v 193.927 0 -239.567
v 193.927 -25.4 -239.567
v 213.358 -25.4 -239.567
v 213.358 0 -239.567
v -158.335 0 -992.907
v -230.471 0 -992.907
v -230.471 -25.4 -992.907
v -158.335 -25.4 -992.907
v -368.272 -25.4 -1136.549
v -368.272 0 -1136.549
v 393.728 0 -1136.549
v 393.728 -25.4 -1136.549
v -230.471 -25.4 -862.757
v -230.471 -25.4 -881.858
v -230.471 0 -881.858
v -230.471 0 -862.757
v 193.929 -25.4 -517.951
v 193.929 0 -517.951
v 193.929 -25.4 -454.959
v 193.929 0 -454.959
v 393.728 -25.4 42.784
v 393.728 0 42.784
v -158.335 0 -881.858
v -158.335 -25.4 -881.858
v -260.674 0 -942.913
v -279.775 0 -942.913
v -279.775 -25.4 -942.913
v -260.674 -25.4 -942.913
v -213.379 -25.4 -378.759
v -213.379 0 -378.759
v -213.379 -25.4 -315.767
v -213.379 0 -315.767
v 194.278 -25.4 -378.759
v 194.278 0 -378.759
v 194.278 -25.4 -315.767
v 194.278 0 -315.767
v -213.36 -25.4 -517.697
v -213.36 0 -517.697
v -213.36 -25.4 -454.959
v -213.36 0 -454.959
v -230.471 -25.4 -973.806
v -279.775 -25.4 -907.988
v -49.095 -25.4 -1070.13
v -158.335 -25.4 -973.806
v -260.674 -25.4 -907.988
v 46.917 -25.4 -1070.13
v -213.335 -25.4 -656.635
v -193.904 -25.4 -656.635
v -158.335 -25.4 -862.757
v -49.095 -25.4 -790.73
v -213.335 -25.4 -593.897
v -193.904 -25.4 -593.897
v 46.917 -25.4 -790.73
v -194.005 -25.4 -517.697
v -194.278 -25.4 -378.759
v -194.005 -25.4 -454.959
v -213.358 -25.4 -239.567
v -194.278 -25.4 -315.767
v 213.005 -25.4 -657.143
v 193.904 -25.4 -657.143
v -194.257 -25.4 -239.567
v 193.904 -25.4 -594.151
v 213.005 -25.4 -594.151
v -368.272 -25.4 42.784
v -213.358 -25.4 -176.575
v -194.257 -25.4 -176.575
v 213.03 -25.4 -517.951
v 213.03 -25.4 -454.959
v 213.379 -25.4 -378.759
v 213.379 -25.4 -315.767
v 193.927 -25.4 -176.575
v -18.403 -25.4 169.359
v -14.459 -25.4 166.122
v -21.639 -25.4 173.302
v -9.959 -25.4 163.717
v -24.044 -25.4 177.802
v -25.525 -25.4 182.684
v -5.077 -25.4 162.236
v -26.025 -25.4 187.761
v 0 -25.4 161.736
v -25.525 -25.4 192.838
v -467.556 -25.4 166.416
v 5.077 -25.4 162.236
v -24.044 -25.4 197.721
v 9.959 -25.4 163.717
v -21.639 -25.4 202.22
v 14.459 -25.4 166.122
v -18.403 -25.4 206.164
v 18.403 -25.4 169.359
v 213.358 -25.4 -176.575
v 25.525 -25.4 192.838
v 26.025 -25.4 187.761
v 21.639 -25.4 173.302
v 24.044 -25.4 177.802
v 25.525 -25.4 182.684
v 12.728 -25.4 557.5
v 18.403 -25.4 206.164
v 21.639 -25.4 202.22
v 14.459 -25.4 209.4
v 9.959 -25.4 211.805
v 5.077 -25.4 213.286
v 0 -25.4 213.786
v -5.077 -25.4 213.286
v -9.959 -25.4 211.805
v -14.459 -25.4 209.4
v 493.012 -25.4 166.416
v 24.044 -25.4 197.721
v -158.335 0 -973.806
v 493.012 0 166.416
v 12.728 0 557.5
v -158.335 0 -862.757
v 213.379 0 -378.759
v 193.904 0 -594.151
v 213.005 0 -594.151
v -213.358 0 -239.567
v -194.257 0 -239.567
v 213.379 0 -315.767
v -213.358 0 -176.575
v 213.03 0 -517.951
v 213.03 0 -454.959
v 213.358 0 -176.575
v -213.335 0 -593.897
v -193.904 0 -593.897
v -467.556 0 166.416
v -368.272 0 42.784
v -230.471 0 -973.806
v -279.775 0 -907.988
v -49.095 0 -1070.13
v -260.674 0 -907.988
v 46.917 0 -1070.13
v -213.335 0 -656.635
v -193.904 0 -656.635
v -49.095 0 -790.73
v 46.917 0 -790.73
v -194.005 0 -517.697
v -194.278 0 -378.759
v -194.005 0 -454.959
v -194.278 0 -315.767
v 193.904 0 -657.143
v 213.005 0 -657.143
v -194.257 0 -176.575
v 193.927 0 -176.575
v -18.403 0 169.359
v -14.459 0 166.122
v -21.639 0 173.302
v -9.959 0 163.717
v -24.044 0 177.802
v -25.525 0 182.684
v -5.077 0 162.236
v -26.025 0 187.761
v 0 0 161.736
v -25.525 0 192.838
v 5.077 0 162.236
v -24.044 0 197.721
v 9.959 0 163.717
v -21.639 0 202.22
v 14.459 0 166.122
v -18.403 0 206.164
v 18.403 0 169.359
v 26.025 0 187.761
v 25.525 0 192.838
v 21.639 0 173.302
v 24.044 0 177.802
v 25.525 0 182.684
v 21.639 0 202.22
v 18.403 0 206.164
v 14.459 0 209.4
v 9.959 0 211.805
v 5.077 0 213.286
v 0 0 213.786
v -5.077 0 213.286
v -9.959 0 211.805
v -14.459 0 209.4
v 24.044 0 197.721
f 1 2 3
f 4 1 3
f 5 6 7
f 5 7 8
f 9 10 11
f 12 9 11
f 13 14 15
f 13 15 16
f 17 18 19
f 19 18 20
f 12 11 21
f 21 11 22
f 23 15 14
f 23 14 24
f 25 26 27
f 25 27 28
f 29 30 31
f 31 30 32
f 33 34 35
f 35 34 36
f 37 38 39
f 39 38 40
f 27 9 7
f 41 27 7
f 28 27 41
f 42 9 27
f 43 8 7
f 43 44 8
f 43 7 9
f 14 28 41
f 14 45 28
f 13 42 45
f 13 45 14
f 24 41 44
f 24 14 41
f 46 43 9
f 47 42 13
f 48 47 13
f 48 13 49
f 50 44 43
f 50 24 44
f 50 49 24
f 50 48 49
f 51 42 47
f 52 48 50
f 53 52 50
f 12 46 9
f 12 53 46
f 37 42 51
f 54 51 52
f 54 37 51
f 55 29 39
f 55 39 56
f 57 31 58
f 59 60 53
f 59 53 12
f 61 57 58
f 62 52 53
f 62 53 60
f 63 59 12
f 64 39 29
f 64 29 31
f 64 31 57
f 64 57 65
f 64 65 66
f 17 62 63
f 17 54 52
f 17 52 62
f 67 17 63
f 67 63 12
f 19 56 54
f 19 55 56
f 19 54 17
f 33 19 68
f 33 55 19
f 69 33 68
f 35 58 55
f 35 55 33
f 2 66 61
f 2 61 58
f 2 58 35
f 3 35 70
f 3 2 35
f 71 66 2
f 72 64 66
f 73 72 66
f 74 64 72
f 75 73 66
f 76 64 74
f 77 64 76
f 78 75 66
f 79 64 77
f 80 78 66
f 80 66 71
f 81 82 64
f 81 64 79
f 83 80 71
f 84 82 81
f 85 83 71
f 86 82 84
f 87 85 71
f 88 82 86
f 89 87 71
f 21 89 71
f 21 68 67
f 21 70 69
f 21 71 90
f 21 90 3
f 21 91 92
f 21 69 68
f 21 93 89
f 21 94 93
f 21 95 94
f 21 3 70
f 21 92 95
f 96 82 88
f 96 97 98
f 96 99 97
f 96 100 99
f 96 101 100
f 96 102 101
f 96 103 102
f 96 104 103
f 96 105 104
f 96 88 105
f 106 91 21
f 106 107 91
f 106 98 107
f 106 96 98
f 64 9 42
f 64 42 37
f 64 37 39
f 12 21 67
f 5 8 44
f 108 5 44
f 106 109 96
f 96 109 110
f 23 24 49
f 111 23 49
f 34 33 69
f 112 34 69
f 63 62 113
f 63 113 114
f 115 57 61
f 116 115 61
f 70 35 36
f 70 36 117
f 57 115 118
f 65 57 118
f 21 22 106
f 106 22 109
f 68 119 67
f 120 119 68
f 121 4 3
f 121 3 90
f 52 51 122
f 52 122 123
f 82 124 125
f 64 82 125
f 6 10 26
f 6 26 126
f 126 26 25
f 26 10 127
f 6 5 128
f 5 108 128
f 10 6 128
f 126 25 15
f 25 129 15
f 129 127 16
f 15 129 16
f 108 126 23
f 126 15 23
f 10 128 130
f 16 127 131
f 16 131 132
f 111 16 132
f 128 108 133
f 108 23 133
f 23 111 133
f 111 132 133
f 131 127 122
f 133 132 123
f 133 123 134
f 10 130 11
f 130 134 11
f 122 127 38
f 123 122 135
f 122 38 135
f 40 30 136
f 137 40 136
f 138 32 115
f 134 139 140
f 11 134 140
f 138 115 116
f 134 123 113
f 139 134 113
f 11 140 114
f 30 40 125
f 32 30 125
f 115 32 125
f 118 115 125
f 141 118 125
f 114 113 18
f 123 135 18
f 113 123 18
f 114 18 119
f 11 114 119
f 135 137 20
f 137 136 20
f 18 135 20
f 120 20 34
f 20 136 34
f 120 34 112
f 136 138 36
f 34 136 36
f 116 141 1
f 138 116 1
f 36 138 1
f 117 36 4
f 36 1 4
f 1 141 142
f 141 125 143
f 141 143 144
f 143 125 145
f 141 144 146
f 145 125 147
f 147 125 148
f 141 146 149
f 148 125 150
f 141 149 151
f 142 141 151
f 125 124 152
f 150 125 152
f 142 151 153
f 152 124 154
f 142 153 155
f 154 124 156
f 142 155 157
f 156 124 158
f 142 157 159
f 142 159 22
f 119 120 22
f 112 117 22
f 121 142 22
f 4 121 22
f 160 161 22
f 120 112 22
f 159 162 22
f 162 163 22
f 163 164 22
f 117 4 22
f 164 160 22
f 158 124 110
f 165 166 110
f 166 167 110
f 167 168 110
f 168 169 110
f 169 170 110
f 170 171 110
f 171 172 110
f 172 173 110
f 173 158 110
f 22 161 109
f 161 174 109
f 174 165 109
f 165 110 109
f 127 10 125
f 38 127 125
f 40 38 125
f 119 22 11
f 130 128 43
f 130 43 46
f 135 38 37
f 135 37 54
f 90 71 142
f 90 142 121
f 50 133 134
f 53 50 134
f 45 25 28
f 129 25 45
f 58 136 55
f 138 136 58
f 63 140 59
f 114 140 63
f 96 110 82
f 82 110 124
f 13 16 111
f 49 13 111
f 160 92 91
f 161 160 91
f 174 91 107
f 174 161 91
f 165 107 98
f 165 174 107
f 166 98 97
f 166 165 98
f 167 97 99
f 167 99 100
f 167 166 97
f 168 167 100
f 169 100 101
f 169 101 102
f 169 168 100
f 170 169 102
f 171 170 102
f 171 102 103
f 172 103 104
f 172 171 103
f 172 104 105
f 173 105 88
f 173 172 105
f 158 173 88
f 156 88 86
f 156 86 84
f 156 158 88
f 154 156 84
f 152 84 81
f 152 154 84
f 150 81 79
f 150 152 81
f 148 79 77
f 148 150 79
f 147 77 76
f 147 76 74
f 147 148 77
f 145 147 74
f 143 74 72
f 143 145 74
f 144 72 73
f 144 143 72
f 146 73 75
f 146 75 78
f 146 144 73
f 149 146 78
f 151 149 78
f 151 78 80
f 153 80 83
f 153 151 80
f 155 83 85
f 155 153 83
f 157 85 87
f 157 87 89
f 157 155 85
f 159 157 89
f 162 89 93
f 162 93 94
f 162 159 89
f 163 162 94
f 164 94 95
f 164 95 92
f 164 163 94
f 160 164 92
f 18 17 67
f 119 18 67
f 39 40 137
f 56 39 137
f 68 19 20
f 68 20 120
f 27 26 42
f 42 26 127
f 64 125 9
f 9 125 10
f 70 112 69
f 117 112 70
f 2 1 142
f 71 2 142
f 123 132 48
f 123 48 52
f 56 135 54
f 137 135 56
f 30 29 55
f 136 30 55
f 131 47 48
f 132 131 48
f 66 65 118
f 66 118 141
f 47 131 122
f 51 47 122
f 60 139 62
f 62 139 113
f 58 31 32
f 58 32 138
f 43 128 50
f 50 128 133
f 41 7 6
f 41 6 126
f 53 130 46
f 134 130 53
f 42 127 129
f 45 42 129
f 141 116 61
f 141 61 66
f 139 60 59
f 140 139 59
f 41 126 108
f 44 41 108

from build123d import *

# Parameters (mm, degrees)
F0_W     = 19.1008
F0_H     = 34.925
F0_W_2   = 72.136
F0_H_2   = 19.1008
F0_W_3   = 96.012
F0_H_3   = 279.4
F0_W_4   = 19.431
F0_H_4   = 62.737998
F0_W_5   = 19.3548
F0_H_5   = 62.738
F0_H_6   = 62.992
F0_R     = 26.025224
F1_DEPTH = 25.4


with BuildPart() as f1:
    # F0 (on Front) → F1 (new body)
    with BuildSketch(Plane.XZ):
        Polygon((12.727918, 557.499766), (-467.555925, 166.415552), (-368.272082, 42.7843), (-368.272082, -618.276235), (-368.272082, -1136.548519), (393.727918, -1136.548519), (393.727918, -618.276235), (393.727918, 42.7843), (493.011761, 166.415552), align=None)
        with Locations((-270.224877, -925.450377)):
            Rectangle(F0_W, F0_H, mode=Mode.SUBTRACT)
        with Locations((-194.402747, -983.356682)):
            Rectangle(F0_W_2, F0_H_2, mode=Mode.SUBTRACT)
        with Locations((-1.08871, -930.430109)):
            Rectangle(F0_W_3, F0_H_3, mode=Mode.SUBTRACT)
        with Locations((-194.402747, -872.307882)):
            Rectangle(F0_W_2, F0_H_2, mode=Mode.SUBTRACT)
        with Locations((-203.619584, -625.265823)):
            Rectangle(F0_W_4, F0_H_4, mode=Mode.SUBTRACT)
        with Locations((-203.6826, -486.327824)):
            Rectangle(F0_W_5, F0_H_5, mode=Mode.SUBTRACT)
        with Locations((-203.828264, -347.262824)):
            Rectangle(F0_W, F0_H_6, mode=Mode.SUBTRACT)
        with Locations((203.454484, -625.646824)):
            Rectangle(F0_W, F0_H_6, mode=Mode.SUBTRACT)
        with Locations((203.4794, -486.454824)):
            Rectangle(F0_W, F0_H_6, mode=Mode.SUBTRACT)
        with Locations((203.828264, -347.262824)):
            Rectangle(F0_W, F0_H_6, mode=Mode.SUBTRACT)
        with Locations((-203.807441, -208.070824)):
            Rectangle(F0_W, F0_H_6, mode=Mode.SUBTRACT)
        with Locations((0, 187.761217)):
            Circle(F0_R, mode=Mode.SUBTRACT)
        with Locations((203.642379, -208.070824)):
            Rectangle(F0_W_4, F0_H_6, mode=Mode.SUBTRACT)
    extrude(amount=F1_DEPTH)


solid = f1.part
